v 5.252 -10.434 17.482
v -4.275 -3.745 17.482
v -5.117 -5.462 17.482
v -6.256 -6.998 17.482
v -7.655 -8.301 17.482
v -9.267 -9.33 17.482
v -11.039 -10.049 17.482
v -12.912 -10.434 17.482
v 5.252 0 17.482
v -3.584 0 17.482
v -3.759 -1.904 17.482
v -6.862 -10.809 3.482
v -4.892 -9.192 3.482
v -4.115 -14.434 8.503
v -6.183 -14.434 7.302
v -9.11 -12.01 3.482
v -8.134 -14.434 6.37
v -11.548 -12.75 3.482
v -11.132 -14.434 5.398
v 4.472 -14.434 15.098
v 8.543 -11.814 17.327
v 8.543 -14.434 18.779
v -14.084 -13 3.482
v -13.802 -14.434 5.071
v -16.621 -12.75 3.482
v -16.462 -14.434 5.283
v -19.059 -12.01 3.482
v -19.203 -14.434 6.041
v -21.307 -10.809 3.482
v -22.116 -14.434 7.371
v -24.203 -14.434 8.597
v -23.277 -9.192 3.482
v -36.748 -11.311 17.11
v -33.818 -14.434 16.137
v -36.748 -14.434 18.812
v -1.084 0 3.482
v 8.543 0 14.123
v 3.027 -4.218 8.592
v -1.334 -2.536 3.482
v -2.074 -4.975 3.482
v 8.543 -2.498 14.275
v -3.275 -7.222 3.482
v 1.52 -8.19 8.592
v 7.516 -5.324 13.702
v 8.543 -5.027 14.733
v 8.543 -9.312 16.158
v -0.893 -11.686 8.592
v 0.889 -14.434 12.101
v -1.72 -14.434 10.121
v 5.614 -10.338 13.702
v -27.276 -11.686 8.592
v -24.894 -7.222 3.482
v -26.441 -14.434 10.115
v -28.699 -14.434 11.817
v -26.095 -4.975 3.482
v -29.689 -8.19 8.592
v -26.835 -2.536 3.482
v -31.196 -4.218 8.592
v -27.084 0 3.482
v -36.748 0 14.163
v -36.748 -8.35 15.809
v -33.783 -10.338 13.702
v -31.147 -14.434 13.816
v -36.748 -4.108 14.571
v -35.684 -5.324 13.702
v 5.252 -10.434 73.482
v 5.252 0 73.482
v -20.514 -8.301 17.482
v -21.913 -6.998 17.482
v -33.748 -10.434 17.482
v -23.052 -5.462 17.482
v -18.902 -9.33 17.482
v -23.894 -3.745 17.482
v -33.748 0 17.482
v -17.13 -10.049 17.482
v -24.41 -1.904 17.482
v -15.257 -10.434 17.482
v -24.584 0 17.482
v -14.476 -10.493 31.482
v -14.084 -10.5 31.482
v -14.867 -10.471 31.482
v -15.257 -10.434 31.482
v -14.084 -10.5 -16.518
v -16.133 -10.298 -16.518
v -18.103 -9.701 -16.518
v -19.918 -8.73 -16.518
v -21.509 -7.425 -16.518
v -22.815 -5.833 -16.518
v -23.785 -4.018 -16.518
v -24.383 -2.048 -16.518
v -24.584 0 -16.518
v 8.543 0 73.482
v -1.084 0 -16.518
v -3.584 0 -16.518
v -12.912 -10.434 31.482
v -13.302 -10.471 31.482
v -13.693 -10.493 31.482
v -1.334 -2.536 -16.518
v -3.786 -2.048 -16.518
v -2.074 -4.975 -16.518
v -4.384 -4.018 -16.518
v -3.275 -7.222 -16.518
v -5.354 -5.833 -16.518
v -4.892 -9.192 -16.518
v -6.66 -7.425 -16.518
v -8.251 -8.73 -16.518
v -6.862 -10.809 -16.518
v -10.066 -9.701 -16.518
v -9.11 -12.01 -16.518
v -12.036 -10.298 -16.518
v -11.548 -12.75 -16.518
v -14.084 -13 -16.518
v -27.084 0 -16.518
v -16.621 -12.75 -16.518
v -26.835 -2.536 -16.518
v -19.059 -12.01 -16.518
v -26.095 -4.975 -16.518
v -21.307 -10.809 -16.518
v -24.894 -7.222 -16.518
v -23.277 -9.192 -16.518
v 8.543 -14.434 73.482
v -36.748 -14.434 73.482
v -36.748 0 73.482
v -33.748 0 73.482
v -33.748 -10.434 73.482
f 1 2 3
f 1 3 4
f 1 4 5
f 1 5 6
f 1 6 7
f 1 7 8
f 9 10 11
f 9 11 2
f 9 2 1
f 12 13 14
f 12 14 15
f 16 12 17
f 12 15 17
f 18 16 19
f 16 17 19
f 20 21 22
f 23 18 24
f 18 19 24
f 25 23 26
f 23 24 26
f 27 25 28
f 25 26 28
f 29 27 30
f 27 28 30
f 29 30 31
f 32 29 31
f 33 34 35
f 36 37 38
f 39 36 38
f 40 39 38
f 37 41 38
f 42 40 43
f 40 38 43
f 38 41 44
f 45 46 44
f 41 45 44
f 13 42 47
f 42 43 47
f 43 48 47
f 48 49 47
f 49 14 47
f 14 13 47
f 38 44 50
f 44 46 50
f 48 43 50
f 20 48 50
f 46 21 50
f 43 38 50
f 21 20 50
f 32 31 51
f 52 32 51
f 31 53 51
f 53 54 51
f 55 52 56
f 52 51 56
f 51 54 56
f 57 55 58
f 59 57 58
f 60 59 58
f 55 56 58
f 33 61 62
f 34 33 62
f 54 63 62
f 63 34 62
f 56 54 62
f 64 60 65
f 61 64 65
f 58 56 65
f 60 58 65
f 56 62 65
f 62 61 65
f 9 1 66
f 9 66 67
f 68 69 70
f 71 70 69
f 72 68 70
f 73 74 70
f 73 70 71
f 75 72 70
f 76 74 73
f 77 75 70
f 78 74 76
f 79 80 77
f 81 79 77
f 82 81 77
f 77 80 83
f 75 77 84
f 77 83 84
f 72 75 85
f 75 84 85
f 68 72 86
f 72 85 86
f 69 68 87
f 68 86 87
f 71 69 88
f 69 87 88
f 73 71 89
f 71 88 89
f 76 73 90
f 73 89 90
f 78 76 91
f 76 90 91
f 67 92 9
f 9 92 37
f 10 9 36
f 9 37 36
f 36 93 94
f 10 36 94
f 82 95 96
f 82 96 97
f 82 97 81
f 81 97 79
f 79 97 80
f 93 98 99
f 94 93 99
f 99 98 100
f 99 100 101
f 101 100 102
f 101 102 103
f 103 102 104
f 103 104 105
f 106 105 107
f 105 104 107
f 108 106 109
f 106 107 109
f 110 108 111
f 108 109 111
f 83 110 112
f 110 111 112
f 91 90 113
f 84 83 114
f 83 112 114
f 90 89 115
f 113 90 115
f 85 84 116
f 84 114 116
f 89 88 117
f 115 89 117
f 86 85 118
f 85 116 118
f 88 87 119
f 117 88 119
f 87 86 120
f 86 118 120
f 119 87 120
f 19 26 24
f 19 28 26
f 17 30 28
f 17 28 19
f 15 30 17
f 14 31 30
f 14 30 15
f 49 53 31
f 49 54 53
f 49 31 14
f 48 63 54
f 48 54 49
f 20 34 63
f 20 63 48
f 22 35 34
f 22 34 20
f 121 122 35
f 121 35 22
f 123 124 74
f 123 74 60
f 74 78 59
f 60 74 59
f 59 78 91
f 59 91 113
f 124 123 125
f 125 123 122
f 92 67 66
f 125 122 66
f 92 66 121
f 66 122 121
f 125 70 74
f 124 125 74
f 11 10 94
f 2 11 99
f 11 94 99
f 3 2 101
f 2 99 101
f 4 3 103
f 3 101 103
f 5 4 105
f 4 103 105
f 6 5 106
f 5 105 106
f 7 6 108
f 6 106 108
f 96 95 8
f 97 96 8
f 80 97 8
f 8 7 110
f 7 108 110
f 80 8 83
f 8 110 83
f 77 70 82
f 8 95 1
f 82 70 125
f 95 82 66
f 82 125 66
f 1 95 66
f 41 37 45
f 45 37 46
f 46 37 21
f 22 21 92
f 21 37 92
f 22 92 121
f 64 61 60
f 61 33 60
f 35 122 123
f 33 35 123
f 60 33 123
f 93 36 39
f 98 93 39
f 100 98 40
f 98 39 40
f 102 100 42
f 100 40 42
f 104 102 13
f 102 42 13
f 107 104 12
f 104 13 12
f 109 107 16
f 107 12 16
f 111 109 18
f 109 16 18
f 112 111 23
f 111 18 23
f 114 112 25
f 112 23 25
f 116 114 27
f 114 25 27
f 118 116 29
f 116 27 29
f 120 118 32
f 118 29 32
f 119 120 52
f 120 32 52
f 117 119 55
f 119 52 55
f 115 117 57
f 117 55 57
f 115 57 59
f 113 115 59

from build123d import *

# Parameters (mm, degrees)
CUT_EXTRUDE6_DEPTH  = 75
CUT_EXTRUDE7_DEPTH  = 48
SKETCH11_W          = 39
SKETCH11_H          = 22
CUT_EXTRUDE8_DEPTH  = 56
SKETCH14_W          = 50.821005264
SKETCH14_H          = 8.659157084
SKETCH14_W_2        = 55.150583806
SKETCH14_H_2        = 9.071497897
CUT_EXTRUDE11_DEPTH = 90
SKETCH15_W          = 52.591955303
SKETCH15_H          = 17.949813053
CUT_EXTRUDE12_DEPTH = 100


with BuildPart() as part:
    # Sketch1 → Revolve1 (revolve)
    with BuildSketch(Plane(origin=(0, 0, 0), x_dir=(1, 0, 0), z_dir=(0, 1, 0))):
        Polygon((-14.084428196, 16.517586435), (-1.084428196, 16.517586435), (-1.084428196, -3.482413565), (17.915571804, -24.482413565), (17.915571804, -73.482413565), (-14.084428196, -73.482413565), align=None)
    revolve(axis=Axis((-14.084428196, 0, 73.482413565), (0, 0, -1)))

    # Sketch7 → Cut-Extrude6 (cut)
    with BuildSketch(Plane.XY.offset(73.482413565)):
        with BuildLine():
            ThreePointArc((8.542988801, 22.627416998), (-1.838558361, 29.56414504), (-14.084428196, 32))
            Line((-14.084428196, 32), (-14.084428196, 22.627416998))
            Line((-14.084428196, 22.627416998), (8.542988801, 22.627416998))
        make_face()
        with BuildLine():
            Line((-14.084428196, 22.627416998), (-14.084428196, 32))
            ThreePointArc((-14.084428196, 32), (-26.330298032, 29.56414504), (-36.711845194, 22.627416998))
            Line((-36.711845194, 22.627416998), (-14.084428196, 22.627416998))
        make_face()
        with BuildLine():
            Line((-36.747904754, 0), (-36.747904754, 22.591299881))
            ThreePointArc((-36.747904754, 22.591299881), (-43.658329274, 12.222290091), (-46.084428196, 0))
            Line((-46.084428196, 0), (-36.747904754, 0))
        make_face()
        with BuildLine():
            Line((-36.747904754, -22.591299881), (-36.747904754, 0))
            Line((-36.747904754, 0), (-46.084428196, 0))
            ThreePointArc((-46.084428196, 0), (-43.658329274, -12.222290091), (-36.747904754, -22.591299881))
        make_face()
        with BuildLine():
            Line((-14.084428196, -32), (-14.084428196, -22.591299881))
            Line((-14.084428196, -22.591299881), (-36.747904754, -22.591299881))
            ThreePointArc((-36.747904754, -22.591299881), (-26.353869989, -29.554370203), (-14.084428196, -32))
        make_face()
        with BuildLine():
            ThreePointArc((17.915571804, 0), (15.479716844, 12.245869836), (8.542988801, 22.627416998))
            Line((8.542988801, 22.627416998), (8.542988801, 0))
            Line((8.542988801, 0), (17.915571804, 0))
        make_face()
        with BuildLine():
            Line((17.915571804, 0), (8.542988801, 0))
            Line((8.542988801, 0), (8.542988801, -22.591299881))
            Line((8.542988801, -22.591299881), (-14.084428196, -22.591299881))
            Line((-14.084428196, -22.591299881), (-14.084428196, -32))
            ThreePointArc((-14.084428196, -32), (8.542988801, -22.627416998), (17.915571804, 0))
        make_face()
    extrude(amount=-CUT_EXTRUDE6_DEPTH, mode=Mode.SUBTRACT)

    # Sketch10 → Cut-Extrude7 (cut)
    with BuildSketch(Plane(origin=(0, 0, -16.517586435), x_dir=(-1, 0, 0), z_dir=(0, 0, -1))):
        with BuildLine():
            ThreePointArc((24.584428196, 0), (21.509049399, 7.424621202), (14.084428196, 10.5))
            Line((14.084428196, 10.5), (14.084428196, 0))
            Line((14.084428196, 0), (24.584428196, 0))
        make_face()
        with BuildLine():
            Line((14.084428196, 0), (14.084428196, 10.5))
            ThreePointArc((14.084428196, 10.5), (6.659806994, 7.424621202), (3.584428196, 0))
            Line((3.584428196, 0), (14.084428196, 0))
        make_face()
        with BuildLine():
            Line((24.584428196, 0), (14.084428196, 0))
            Line((14.084428196, 0), (14.084428196, -10.5))
            ThreePointArc((14.084428196, -10.5), (21.509049399, -7.424621202), (24.584428196, 0))
        make_face()
        with BuildLine():
            Line((14.084428196, -10.5), (14.084428196, 0))
            Line((14.084428196, 0), (3.584428196, 0))
            ThreePointArc((3.584428196, 0), (6.659806994, -7.424621202), (14.084428196, -10.5))
        make_face()
    extrude(amount=-CUT_EXTRUDE7_DEPTH, mode=Mode.SUBTRACT)

    # Sketch11 → Cut-Extrude8 (cut)
    with BuildSketch(Plane.XY.offset(73.482413565)):
        with Locations((-14.247904754, 0.565694089)):
            Rectangle(SKETCH11_W, SKETCH11_H)
    extrude(amount=-CUT_EXTRUDE8_DEPTH, mode=Mode.SUBTRACT)

    # Sketch14 → Cut-Extrude11 (cut)
    with BuildSketch(Plane.XY.offset(73.482413565)):
        with Locations((-14.154000578, 19.895272631)):
            Rectangle(SKETCH14_W, SKETCH14_H)
        with Locations((-15.391023019, -18.97005486)):
            Rectangle(SKETCH14_W_2, SKETCH14_H_2)
    extrude(amount=-CUT_EXTRUDE11_DEPTH, mode=Mode.SUBTRACT)

    # Sketch15 → Cut-Extrude12 (cut)
    with BuildSketch(Plane(origin=(0, 0, -16.517586435), x_dir=(-1, 0, 0), z_dir=(0, 0, -1))):
        with Locations((12.823626237, 8.974906526)):
            Rectangle(SKETCH15_W, SKETCH15_H)
    extrude(amount=-CUT_EXTRUDE12_DEPTH, mode=Mode.SUBTRACT)


solid = part.part
